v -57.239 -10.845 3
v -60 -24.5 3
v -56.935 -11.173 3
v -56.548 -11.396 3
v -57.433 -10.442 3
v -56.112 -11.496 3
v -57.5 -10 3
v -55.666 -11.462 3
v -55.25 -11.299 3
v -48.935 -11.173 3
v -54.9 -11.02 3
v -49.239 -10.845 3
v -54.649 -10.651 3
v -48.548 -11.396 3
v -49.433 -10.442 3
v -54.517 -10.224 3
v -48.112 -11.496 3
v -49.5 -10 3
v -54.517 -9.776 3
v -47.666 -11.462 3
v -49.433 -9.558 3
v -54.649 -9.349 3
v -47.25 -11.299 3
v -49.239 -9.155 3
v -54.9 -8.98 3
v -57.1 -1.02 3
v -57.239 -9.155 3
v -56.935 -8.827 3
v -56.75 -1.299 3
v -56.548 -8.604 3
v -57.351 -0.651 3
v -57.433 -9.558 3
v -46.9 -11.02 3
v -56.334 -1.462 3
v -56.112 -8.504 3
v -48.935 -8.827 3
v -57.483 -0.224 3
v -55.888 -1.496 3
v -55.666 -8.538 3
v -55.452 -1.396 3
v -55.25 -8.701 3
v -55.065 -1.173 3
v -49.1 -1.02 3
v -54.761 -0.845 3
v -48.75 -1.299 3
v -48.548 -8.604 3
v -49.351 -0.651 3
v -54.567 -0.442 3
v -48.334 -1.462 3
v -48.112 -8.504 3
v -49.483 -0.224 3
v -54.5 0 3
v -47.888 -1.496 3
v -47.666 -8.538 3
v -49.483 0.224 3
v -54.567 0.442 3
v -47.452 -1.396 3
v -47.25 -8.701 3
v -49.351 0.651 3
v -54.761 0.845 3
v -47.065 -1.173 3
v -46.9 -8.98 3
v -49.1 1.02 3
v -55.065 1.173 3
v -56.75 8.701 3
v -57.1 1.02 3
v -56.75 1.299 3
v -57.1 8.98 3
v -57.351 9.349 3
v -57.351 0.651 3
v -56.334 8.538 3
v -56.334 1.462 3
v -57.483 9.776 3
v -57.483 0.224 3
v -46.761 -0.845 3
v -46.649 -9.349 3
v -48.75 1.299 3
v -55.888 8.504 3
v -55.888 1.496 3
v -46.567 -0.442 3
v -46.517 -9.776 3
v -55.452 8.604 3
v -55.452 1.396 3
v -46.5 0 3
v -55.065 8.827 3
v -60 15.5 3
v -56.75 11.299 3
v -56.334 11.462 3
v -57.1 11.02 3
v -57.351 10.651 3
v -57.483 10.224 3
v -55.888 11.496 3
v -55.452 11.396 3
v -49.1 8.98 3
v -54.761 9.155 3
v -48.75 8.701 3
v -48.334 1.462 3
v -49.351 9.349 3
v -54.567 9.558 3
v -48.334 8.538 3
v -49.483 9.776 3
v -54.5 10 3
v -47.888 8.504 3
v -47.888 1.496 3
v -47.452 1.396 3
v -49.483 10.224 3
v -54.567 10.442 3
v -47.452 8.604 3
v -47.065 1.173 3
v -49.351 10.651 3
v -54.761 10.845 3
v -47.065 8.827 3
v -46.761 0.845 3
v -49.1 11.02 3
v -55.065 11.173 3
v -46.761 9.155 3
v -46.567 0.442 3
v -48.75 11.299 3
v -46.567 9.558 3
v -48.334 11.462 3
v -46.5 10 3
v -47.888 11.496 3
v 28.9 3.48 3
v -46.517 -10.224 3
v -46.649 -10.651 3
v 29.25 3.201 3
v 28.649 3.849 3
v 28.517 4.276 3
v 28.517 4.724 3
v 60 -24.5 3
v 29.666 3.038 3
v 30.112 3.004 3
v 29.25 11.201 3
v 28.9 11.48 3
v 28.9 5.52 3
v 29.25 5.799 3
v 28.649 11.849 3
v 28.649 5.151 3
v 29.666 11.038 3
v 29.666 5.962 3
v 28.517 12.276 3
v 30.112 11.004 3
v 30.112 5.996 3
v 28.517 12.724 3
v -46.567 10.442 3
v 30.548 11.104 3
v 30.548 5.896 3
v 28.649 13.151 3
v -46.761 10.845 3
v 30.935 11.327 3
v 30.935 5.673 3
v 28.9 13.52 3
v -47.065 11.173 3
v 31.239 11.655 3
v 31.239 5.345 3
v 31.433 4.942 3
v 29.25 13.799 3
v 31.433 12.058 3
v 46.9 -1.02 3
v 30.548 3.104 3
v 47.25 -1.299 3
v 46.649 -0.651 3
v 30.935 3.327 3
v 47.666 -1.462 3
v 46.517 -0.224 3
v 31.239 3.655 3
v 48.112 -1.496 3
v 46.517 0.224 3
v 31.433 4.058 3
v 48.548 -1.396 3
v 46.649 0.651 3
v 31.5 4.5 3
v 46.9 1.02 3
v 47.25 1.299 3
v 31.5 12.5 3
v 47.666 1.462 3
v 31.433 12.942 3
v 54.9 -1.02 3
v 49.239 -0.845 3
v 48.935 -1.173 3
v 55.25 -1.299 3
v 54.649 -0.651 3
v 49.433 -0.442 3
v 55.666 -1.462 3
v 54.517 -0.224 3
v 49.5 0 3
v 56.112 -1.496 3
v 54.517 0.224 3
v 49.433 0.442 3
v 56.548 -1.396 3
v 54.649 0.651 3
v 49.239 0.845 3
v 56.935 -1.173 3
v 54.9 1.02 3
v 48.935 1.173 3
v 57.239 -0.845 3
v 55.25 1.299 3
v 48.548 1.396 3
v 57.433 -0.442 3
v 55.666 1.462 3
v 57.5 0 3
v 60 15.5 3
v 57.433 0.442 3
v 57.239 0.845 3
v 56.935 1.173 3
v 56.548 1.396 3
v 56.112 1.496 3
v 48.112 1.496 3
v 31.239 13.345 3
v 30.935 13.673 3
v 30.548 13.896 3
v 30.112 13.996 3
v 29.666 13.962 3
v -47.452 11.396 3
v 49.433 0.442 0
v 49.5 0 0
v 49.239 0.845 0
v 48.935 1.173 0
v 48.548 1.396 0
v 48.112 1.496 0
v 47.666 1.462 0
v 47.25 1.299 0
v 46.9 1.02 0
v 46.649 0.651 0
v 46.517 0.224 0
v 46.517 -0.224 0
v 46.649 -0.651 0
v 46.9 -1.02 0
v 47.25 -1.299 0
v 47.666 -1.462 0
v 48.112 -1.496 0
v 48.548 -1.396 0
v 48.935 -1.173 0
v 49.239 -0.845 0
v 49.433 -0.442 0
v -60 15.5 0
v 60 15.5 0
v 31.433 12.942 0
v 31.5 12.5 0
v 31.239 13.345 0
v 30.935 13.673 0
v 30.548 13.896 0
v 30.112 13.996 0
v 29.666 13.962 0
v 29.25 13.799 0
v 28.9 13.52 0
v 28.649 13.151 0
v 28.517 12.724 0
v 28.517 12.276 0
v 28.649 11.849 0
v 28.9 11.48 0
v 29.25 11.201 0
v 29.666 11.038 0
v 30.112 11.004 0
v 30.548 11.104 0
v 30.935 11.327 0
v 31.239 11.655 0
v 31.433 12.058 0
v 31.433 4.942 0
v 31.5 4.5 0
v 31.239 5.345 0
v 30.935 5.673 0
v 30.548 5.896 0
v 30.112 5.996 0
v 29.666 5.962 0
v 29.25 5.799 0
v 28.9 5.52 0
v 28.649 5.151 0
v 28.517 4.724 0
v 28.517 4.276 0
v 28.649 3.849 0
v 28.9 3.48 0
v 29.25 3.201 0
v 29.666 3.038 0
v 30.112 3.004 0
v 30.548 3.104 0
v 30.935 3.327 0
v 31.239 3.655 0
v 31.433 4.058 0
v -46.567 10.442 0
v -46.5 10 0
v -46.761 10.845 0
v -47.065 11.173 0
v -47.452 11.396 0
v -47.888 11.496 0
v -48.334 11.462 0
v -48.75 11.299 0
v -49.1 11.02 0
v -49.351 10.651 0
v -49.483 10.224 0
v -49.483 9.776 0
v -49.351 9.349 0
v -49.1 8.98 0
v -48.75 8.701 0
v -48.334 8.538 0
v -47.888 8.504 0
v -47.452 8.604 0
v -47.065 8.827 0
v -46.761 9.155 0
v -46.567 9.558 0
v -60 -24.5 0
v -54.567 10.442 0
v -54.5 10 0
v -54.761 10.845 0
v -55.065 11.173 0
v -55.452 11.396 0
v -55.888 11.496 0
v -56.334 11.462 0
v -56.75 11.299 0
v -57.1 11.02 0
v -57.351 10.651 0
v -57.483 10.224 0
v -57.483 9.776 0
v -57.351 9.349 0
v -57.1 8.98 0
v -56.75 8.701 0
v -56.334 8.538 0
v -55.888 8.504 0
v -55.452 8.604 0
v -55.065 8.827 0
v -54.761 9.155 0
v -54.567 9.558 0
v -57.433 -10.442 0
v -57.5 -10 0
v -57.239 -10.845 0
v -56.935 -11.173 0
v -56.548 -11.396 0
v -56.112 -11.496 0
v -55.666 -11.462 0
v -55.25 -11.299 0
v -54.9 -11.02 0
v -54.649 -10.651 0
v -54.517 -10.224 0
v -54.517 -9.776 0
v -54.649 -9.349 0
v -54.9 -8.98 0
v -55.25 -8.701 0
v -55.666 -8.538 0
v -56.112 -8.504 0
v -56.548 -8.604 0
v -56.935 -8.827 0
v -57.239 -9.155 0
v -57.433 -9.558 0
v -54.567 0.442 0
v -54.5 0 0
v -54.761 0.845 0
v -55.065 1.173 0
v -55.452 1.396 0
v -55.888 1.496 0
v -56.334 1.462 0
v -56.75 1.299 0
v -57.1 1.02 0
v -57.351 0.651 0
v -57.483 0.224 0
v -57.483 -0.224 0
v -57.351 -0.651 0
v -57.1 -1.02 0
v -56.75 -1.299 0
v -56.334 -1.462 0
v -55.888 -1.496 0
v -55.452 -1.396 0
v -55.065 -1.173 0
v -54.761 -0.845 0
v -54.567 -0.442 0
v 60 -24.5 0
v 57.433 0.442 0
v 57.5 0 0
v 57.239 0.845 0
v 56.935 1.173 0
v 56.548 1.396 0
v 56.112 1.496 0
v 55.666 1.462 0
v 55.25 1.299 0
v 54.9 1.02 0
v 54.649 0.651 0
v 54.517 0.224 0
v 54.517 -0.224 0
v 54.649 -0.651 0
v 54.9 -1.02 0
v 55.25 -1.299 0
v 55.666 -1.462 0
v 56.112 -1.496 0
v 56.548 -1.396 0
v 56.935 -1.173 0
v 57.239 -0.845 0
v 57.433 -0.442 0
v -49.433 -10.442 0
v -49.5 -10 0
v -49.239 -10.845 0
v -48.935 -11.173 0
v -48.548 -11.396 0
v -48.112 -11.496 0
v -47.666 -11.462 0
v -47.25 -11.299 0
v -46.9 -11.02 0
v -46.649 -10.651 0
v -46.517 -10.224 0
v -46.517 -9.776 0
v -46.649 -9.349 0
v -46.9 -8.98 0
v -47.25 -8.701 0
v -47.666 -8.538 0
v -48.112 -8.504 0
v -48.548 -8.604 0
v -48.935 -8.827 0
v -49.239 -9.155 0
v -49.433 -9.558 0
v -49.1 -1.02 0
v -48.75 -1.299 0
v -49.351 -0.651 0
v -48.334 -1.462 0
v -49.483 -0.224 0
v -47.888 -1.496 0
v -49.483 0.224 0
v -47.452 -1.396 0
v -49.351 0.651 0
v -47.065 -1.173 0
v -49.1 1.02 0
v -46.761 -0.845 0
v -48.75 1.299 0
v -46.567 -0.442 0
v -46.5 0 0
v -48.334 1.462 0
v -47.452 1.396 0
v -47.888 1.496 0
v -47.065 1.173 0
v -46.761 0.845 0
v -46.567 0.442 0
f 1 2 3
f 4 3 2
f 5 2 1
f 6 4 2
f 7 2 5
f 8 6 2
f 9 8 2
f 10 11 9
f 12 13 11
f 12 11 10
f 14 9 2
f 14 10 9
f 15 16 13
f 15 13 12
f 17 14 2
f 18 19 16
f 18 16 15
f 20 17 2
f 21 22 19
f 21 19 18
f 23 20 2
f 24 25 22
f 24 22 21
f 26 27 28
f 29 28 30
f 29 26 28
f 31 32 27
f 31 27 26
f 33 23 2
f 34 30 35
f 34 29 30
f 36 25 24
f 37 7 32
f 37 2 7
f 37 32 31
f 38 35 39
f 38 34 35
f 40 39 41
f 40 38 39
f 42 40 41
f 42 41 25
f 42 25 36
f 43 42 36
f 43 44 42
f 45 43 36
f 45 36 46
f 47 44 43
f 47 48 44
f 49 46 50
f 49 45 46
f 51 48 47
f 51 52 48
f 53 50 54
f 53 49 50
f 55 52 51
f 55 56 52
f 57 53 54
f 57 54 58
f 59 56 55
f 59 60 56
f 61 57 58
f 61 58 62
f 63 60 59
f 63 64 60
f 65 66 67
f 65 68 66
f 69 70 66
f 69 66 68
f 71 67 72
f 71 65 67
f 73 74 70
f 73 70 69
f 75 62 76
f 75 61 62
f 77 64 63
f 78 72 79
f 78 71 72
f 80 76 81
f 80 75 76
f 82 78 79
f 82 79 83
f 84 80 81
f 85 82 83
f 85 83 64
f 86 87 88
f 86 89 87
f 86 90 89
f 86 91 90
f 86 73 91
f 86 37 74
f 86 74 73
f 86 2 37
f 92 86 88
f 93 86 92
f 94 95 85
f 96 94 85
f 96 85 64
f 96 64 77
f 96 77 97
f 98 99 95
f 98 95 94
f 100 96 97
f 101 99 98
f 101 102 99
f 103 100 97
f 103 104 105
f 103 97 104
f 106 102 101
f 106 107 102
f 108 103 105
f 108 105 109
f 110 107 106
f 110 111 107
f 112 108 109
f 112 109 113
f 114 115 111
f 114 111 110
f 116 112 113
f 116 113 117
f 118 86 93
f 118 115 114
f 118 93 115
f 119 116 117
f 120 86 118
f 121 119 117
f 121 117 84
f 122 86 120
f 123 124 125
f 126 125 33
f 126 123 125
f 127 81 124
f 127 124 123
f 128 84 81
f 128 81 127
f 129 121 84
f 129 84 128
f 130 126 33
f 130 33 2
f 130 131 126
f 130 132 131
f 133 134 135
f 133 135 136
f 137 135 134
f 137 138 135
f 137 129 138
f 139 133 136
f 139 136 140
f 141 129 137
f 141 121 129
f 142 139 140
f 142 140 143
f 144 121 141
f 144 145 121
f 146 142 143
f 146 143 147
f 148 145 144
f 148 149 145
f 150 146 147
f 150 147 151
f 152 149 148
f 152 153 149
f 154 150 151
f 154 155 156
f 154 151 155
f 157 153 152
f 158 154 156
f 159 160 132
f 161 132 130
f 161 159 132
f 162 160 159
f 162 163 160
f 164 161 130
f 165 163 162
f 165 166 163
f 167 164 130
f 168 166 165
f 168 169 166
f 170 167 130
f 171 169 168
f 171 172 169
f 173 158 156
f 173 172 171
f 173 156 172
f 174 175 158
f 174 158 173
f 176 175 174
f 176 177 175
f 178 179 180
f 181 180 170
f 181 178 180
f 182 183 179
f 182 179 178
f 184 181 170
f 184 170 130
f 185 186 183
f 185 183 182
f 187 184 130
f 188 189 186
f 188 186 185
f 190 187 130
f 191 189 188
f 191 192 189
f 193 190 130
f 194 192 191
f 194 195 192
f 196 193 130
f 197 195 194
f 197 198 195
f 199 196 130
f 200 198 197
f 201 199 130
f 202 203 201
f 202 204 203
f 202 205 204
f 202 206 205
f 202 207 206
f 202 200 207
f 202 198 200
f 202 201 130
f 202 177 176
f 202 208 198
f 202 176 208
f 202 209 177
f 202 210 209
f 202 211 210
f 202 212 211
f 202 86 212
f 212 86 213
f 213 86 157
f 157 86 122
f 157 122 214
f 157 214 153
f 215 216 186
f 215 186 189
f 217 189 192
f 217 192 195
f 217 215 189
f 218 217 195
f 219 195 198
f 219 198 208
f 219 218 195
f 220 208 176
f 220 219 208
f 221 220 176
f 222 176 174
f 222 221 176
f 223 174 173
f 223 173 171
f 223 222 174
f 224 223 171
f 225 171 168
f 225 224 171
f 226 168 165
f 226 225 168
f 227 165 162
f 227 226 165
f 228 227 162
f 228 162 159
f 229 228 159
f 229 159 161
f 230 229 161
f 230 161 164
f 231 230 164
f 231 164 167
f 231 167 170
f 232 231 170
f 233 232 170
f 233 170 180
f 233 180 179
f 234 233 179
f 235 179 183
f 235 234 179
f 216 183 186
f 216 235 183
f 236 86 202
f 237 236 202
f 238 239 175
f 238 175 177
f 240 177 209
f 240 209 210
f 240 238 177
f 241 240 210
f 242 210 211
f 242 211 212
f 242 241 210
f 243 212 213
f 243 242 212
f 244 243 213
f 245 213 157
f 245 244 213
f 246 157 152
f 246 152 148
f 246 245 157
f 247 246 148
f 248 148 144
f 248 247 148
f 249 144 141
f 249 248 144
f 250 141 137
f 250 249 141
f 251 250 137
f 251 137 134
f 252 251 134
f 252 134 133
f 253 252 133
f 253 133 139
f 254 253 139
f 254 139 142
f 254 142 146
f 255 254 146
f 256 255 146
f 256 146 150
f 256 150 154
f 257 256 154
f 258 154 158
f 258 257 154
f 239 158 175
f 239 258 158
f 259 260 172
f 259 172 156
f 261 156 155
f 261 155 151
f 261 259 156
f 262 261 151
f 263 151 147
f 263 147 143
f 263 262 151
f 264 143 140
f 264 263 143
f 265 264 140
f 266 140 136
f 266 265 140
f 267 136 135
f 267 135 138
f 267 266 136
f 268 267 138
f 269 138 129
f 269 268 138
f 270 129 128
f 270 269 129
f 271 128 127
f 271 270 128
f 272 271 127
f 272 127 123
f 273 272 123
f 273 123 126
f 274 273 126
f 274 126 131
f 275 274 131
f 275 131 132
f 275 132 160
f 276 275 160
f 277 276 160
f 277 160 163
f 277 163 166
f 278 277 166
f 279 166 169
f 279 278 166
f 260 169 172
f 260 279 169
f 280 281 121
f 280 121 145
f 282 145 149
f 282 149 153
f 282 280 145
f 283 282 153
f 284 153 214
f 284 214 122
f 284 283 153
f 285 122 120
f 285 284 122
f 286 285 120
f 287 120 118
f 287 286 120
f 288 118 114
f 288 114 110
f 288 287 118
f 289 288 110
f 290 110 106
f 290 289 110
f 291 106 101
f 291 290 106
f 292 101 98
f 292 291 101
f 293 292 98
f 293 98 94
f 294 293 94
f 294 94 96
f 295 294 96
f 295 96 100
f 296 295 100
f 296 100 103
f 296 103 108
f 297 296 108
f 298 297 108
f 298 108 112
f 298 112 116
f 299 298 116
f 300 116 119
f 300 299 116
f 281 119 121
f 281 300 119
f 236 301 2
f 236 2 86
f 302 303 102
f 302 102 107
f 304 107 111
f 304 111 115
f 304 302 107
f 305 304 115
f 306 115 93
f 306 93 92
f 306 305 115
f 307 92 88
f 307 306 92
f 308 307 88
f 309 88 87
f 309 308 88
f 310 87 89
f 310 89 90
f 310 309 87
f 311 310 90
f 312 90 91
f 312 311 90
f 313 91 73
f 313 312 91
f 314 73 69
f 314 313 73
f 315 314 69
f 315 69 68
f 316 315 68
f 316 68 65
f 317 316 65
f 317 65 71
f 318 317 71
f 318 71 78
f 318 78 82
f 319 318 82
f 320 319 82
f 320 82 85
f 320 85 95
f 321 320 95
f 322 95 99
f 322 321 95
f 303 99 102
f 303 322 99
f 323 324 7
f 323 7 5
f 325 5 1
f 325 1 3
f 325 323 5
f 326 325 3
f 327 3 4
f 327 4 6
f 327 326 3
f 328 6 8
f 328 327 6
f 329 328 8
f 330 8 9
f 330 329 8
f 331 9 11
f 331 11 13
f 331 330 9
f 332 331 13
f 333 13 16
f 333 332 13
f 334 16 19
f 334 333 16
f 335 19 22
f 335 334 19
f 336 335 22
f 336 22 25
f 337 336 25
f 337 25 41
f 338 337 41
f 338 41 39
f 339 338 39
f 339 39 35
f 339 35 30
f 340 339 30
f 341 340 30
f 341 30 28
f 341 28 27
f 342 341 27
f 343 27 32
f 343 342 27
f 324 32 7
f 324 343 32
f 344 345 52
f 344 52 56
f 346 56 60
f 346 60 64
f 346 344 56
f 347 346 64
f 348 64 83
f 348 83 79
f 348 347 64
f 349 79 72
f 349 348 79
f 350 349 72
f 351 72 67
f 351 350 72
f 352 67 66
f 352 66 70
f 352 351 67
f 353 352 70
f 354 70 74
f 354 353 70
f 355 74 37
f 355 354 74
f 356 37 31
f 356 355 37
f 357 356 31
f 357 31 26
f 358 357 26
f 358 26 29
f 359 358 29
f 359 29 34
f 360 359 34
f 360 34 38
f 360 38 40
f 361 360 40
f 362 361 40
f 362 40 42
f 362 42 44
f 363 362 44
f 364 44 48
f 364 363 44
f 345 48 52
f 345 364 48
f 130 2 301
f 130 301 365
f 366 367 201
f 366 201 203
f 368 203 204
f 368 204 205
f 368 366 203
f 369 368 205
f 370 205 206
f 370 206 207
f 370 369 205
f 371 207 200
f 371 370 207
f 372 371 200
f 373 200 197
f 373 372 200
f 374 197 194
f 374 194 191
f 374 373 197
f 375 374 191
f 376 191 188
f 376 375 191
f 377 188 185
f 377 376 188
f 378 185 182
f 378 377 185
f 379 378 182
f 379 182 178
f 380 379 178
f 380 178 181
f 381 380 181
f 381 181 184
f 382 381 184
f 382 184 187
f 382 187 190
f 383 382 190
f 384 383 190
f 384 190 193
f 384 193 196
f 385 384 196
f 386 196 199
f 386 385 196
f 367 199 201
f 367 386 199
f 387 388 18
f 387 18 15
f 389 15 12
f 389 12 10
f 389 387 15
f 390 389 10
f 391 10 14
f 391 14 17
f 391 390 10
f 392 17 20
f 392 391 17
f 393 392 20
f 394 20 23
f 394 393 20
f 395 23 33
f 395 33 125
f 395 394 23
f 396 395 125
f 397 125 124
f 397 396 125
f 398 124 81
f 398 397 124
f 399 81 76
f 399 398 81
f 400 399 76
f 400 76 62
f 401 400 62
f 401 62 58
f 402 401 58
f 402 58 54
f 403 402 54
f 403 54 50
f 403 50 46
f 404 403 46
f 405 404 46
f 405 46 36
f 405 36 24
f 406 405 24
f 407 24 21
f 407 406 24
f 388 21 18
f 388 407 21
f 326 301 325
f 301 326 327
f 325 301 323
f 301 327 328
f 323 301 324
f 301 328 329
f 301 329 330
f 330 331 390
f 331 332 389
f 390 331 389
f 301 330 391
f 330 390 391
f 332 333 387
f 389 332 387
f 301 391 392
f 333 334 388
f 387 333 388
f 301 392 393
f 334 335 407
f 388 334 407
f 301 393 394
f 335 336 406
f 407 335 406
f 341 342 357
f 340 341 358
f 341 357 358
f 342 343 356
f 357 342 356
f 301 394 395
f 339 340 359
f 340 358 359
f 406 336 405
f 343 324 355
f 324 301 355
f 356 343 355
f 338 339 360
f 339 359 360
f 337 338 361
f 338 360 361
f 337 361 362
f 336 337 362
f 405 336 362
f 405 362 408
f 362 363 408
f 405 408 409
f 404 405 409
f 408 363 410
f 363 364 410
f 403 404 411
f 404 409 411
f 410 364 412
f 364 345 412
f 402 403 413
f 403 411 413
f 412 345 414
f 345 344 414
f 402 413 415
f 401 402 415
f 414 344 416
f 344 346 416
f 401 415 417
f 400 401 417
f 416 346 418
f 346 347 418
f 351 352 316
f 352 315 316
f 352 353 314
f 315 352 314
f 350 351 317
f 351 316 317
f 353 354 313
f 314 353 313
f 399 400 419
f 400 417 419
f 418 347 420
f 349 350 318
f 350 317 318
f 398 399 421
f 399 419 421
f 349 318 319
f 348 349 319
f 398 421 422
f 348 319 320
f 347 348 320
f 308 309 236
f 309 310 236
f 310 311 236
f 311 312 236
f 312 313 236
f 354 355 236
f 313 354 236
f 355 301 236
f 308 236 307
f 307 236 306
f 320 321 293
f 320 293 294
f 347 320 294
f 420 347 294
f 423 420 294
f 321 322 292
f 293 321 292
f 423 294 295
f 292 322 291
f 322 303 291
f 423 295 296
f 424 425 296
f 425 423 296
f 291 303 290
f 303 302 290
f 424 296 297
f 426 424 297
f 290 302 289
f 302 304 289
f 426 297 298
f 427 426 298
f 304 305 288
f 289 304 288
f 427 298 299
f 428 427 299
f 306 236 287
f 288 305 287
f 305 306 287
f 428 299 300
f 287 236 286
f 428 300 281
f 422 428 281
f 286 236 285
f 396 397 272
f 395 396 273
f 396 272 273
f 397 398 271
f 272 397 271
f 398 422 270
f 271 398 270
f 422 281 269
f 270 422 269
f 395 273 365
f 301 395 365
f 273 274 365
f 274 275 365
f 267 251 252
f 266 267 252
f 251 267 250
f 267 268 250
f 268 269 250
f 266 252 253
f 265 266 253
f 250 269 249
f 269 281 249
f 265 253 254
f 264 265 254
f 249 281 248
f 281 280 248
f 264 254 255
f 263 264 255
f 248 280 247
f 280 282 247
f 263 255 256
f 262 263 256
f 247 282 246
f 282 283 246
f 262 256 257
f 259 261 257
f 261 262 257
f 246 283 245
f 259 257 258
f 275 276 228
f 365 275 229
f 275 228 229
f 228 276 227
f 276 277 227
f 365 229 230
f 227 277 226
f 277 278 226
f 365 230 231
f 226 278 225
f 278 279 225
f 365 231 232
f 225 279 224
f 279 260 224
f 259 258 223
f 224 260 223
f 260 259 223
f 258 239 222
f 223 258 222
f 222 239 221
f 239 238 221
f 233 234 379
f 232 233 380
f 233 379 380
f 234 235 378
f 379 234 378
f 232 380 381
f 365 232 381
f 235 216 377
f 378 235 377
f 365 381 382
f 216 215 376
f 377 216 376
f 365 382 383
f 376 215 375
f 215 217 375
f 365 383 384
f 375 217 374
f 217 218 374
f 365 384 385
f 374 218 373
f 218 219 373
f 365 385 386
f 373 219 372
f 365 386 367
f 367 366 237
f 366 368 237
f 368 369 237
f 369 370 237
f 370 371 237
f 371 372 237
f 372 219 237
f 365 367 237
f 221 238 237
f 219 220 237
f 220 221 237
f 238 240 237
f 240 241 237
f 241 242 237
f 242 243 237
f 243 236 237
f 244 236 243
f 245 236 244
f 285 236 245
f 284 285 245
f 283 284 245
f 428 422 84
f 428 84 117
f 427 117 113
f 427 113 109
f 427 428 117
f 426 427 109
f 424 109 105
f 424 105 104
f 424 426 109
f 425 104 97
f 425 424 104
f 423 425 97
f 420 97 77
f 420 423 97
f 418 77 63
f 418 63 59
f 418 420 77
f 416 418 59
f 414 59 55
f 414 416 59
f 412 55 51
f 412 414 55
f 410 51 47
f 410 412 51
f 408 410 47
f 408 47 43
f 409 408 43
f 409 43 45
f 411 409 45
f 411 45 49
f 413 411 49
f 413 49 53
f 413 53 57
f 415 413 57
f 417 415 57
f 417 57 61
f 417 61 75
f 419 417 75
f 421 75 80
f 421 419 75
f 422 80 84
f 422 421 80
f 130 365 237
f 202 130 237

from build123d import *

# Parameters (mm, degrees)
SKETCH1_W           = 120
SKETCH1_H           = 55
SKETCH1_R           = 1.5
BOSS_EXTRUDE1_DEPTH = 3
CUT_EXTRUDE1_DEPTH  = 67.070038595
SKETCH3_W           = 120
SKETCH3_H           = 3
CUT_EXTRUDE2_DEPTH  = 67.070038595


with BuildPart() as part:
    # Sketch1 → Boss-Extrude1 (new body)
    with BuildSketch(Plane.XY):
        Rectangle(SKETCH1_W, SKETCH1_H)
        with Locations((30, 4.5)):
            Circle(SKETCH1_R, mode=Mode.SUBTRACT)
        with Locations((30, 12.5)):
            Circle(SKETCH1_R, mode=Mode.SUBTRACT)
        with Locations((56, 0)):
            Circle(SKETCH1_R, mode=Mode.SUBTRACT)
        with Locations((48, 0)):
            Circle(SKETCH1_R, mode=Mode.SUBTRACT)
        with Locations((-56, 10)):
            Circle(SKETCH1_R, mode=Mode.SUBTRACT)
        with Locations((-48, 10)):
            Circle(SKETCH1_R, mode=Mode.SUBTRACT)
        with Locations(Location((-56, -10, 0), (0, 0, 180))):
            Circle(SKETCH1_R, mode=Mode.SUBTRACT)
        with Locations(Location((-48, -10, 0), (0, 0, 180))):
            Circle(SKETCH1_R, mode=Mode.SUBTRACT)
        with Locations((-56, 0)):
            Circle(SKETCH1_R, mode=Mode.SUBTRACT)
        with Locations((-48, 0)):
            Circle(SKETCH1_R, mode=Mode.SUBTRACT)
    extrude(amount=BOSS_EXTRUDE1_DEPTH)

    # Sketch2 → Cut-Extrude1 (cut, through all)
    with BuildSketch(Plane.XY.offset(3)):
        Polygon((-60, 15.5), (60, 15.5), (60, 27.5), (-60, 27.514094308), (-60, 27.5), align=None)
    extrude(amount=-CUT_EXTRUDE1_DEPTH, mode=Mode.SUBTRACT)

    # Sketch3 → Cut-Extrude2 (cut, through all)
    with BuildSketch(Plane.XY.offset(3)):
        with Locations((0, -26)):
            Rectangle(SKETCH3_W, SKETCH3_H)
    extrude(amount=-CUT_EXTRUDE2_DEPTH, mode=Mode.SUBTRACT)


solid = part.part
